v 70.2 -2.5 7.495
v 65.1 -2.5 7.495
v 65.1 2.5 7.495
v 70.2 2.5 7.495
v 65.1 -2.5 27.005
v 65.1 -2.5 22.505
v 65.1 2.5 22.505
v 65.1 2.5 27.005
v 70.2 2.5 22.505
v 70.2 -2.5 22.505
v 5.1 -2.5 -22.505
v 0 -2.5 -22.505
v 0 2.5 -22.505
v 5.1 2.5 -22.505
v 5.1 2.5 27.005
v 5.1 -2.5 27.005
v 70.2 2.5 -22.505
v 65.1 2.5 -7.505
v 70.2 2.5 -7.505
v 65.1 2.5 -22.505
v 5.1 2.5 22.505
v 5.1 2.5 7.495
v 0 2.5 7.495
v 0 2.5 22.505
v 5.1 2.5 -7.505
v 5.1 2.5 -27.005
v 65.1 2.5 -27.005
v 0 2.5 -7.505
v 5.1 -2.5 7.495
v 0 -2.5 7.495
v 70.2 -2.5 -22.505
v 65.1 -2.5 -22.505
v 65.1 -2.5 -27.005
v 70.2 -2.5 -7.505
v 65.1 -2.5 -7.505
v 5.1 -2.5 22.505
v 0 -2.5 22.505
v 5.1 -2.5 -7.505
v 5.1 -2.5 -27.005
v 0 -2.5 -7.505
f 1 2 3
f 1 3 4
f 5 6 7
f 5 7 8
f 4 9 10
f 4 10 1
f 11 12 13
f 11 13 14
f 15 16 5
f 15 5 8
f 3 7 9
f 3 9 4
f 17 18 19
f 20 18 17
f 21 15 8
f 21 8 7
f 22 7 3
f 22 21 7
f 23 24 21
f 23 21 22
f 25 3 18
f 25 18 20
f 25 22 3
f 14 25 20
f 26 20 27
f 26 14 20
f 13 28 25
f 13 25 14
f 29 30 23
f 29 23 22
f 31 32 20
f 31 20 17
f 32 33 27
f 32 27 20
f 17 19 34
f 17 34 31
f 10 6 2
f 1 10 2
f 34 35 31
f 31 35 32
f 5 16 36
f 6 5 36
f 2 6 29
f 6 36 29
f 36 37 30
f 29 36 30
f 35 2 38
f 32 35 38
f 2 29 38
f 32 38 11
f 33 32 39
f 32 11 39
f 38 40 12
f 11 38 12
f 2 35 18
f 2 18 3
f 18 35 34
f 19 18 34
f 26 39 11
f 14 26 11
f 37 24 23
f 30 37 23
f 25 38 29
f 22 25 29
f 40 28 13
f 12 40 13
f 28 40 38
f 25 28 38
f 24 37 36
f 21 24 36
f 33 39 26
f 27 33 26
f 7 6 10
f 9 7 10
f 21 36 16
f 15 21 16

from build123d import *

# Parameters (mm, degrees)
SKETCH1_W           = 54.009051094
SKETCH1_H           = 5
BOSS_EXTRUDE1_DEPTH = 70.2
SKETCH5_W           = 5.1
SKETCH5_H           = 4.5
SKETCH5_H_2         = 15
CUT_EXTRUDE1_DEPTH  = 76.380928623


with BuildPart() as part:
    # Sketch1 → Boss-Extrude1 (new body)
    with BuildSketch(Plane(origin=(0, 0, 0), x_dir=(0, 0, -1), z_dir=(1, 0, 0))):
        Rectangle(SKETCH1_W, SKETCH1_H)
    extrude(amount=BOSS_EXTRUDE1_DEPTH)

    # Sketch5 → Cut-Extrude1 (cut, through all)
    with BuildSketch(Plane.XZ.offset(2.5)):
        with Locations((67.65, 24.754525547)):
            Rectangle(SKETCH5_W, SKETCH5_H)
        with Locations((67.65, -24.754525547)):
            Rectangle(SKETCH5_W, SKETCH5_H)
        with Locations((67.65, -0.004525547)):
            Rectangle(SKETCH5_W, SKETCH5_H_2)
        with Locations((2.55, -24.754525547)):
            Rectangle(SKETCH5_W, SKETCH5_H)
        with Locations((2.55, -0.004525547)):
            Rectangle(SKETCH5_W, SKETCH5_H_2)
        with Locations((2.55, 24.754525547)):
            Rectangle(SKETCH5_W, SKETCH5_H)
    extrude(amount=-CUT_EXTRUDE1_DEPTH, mode=Mode.SUBTRACT)


solid = part.part
